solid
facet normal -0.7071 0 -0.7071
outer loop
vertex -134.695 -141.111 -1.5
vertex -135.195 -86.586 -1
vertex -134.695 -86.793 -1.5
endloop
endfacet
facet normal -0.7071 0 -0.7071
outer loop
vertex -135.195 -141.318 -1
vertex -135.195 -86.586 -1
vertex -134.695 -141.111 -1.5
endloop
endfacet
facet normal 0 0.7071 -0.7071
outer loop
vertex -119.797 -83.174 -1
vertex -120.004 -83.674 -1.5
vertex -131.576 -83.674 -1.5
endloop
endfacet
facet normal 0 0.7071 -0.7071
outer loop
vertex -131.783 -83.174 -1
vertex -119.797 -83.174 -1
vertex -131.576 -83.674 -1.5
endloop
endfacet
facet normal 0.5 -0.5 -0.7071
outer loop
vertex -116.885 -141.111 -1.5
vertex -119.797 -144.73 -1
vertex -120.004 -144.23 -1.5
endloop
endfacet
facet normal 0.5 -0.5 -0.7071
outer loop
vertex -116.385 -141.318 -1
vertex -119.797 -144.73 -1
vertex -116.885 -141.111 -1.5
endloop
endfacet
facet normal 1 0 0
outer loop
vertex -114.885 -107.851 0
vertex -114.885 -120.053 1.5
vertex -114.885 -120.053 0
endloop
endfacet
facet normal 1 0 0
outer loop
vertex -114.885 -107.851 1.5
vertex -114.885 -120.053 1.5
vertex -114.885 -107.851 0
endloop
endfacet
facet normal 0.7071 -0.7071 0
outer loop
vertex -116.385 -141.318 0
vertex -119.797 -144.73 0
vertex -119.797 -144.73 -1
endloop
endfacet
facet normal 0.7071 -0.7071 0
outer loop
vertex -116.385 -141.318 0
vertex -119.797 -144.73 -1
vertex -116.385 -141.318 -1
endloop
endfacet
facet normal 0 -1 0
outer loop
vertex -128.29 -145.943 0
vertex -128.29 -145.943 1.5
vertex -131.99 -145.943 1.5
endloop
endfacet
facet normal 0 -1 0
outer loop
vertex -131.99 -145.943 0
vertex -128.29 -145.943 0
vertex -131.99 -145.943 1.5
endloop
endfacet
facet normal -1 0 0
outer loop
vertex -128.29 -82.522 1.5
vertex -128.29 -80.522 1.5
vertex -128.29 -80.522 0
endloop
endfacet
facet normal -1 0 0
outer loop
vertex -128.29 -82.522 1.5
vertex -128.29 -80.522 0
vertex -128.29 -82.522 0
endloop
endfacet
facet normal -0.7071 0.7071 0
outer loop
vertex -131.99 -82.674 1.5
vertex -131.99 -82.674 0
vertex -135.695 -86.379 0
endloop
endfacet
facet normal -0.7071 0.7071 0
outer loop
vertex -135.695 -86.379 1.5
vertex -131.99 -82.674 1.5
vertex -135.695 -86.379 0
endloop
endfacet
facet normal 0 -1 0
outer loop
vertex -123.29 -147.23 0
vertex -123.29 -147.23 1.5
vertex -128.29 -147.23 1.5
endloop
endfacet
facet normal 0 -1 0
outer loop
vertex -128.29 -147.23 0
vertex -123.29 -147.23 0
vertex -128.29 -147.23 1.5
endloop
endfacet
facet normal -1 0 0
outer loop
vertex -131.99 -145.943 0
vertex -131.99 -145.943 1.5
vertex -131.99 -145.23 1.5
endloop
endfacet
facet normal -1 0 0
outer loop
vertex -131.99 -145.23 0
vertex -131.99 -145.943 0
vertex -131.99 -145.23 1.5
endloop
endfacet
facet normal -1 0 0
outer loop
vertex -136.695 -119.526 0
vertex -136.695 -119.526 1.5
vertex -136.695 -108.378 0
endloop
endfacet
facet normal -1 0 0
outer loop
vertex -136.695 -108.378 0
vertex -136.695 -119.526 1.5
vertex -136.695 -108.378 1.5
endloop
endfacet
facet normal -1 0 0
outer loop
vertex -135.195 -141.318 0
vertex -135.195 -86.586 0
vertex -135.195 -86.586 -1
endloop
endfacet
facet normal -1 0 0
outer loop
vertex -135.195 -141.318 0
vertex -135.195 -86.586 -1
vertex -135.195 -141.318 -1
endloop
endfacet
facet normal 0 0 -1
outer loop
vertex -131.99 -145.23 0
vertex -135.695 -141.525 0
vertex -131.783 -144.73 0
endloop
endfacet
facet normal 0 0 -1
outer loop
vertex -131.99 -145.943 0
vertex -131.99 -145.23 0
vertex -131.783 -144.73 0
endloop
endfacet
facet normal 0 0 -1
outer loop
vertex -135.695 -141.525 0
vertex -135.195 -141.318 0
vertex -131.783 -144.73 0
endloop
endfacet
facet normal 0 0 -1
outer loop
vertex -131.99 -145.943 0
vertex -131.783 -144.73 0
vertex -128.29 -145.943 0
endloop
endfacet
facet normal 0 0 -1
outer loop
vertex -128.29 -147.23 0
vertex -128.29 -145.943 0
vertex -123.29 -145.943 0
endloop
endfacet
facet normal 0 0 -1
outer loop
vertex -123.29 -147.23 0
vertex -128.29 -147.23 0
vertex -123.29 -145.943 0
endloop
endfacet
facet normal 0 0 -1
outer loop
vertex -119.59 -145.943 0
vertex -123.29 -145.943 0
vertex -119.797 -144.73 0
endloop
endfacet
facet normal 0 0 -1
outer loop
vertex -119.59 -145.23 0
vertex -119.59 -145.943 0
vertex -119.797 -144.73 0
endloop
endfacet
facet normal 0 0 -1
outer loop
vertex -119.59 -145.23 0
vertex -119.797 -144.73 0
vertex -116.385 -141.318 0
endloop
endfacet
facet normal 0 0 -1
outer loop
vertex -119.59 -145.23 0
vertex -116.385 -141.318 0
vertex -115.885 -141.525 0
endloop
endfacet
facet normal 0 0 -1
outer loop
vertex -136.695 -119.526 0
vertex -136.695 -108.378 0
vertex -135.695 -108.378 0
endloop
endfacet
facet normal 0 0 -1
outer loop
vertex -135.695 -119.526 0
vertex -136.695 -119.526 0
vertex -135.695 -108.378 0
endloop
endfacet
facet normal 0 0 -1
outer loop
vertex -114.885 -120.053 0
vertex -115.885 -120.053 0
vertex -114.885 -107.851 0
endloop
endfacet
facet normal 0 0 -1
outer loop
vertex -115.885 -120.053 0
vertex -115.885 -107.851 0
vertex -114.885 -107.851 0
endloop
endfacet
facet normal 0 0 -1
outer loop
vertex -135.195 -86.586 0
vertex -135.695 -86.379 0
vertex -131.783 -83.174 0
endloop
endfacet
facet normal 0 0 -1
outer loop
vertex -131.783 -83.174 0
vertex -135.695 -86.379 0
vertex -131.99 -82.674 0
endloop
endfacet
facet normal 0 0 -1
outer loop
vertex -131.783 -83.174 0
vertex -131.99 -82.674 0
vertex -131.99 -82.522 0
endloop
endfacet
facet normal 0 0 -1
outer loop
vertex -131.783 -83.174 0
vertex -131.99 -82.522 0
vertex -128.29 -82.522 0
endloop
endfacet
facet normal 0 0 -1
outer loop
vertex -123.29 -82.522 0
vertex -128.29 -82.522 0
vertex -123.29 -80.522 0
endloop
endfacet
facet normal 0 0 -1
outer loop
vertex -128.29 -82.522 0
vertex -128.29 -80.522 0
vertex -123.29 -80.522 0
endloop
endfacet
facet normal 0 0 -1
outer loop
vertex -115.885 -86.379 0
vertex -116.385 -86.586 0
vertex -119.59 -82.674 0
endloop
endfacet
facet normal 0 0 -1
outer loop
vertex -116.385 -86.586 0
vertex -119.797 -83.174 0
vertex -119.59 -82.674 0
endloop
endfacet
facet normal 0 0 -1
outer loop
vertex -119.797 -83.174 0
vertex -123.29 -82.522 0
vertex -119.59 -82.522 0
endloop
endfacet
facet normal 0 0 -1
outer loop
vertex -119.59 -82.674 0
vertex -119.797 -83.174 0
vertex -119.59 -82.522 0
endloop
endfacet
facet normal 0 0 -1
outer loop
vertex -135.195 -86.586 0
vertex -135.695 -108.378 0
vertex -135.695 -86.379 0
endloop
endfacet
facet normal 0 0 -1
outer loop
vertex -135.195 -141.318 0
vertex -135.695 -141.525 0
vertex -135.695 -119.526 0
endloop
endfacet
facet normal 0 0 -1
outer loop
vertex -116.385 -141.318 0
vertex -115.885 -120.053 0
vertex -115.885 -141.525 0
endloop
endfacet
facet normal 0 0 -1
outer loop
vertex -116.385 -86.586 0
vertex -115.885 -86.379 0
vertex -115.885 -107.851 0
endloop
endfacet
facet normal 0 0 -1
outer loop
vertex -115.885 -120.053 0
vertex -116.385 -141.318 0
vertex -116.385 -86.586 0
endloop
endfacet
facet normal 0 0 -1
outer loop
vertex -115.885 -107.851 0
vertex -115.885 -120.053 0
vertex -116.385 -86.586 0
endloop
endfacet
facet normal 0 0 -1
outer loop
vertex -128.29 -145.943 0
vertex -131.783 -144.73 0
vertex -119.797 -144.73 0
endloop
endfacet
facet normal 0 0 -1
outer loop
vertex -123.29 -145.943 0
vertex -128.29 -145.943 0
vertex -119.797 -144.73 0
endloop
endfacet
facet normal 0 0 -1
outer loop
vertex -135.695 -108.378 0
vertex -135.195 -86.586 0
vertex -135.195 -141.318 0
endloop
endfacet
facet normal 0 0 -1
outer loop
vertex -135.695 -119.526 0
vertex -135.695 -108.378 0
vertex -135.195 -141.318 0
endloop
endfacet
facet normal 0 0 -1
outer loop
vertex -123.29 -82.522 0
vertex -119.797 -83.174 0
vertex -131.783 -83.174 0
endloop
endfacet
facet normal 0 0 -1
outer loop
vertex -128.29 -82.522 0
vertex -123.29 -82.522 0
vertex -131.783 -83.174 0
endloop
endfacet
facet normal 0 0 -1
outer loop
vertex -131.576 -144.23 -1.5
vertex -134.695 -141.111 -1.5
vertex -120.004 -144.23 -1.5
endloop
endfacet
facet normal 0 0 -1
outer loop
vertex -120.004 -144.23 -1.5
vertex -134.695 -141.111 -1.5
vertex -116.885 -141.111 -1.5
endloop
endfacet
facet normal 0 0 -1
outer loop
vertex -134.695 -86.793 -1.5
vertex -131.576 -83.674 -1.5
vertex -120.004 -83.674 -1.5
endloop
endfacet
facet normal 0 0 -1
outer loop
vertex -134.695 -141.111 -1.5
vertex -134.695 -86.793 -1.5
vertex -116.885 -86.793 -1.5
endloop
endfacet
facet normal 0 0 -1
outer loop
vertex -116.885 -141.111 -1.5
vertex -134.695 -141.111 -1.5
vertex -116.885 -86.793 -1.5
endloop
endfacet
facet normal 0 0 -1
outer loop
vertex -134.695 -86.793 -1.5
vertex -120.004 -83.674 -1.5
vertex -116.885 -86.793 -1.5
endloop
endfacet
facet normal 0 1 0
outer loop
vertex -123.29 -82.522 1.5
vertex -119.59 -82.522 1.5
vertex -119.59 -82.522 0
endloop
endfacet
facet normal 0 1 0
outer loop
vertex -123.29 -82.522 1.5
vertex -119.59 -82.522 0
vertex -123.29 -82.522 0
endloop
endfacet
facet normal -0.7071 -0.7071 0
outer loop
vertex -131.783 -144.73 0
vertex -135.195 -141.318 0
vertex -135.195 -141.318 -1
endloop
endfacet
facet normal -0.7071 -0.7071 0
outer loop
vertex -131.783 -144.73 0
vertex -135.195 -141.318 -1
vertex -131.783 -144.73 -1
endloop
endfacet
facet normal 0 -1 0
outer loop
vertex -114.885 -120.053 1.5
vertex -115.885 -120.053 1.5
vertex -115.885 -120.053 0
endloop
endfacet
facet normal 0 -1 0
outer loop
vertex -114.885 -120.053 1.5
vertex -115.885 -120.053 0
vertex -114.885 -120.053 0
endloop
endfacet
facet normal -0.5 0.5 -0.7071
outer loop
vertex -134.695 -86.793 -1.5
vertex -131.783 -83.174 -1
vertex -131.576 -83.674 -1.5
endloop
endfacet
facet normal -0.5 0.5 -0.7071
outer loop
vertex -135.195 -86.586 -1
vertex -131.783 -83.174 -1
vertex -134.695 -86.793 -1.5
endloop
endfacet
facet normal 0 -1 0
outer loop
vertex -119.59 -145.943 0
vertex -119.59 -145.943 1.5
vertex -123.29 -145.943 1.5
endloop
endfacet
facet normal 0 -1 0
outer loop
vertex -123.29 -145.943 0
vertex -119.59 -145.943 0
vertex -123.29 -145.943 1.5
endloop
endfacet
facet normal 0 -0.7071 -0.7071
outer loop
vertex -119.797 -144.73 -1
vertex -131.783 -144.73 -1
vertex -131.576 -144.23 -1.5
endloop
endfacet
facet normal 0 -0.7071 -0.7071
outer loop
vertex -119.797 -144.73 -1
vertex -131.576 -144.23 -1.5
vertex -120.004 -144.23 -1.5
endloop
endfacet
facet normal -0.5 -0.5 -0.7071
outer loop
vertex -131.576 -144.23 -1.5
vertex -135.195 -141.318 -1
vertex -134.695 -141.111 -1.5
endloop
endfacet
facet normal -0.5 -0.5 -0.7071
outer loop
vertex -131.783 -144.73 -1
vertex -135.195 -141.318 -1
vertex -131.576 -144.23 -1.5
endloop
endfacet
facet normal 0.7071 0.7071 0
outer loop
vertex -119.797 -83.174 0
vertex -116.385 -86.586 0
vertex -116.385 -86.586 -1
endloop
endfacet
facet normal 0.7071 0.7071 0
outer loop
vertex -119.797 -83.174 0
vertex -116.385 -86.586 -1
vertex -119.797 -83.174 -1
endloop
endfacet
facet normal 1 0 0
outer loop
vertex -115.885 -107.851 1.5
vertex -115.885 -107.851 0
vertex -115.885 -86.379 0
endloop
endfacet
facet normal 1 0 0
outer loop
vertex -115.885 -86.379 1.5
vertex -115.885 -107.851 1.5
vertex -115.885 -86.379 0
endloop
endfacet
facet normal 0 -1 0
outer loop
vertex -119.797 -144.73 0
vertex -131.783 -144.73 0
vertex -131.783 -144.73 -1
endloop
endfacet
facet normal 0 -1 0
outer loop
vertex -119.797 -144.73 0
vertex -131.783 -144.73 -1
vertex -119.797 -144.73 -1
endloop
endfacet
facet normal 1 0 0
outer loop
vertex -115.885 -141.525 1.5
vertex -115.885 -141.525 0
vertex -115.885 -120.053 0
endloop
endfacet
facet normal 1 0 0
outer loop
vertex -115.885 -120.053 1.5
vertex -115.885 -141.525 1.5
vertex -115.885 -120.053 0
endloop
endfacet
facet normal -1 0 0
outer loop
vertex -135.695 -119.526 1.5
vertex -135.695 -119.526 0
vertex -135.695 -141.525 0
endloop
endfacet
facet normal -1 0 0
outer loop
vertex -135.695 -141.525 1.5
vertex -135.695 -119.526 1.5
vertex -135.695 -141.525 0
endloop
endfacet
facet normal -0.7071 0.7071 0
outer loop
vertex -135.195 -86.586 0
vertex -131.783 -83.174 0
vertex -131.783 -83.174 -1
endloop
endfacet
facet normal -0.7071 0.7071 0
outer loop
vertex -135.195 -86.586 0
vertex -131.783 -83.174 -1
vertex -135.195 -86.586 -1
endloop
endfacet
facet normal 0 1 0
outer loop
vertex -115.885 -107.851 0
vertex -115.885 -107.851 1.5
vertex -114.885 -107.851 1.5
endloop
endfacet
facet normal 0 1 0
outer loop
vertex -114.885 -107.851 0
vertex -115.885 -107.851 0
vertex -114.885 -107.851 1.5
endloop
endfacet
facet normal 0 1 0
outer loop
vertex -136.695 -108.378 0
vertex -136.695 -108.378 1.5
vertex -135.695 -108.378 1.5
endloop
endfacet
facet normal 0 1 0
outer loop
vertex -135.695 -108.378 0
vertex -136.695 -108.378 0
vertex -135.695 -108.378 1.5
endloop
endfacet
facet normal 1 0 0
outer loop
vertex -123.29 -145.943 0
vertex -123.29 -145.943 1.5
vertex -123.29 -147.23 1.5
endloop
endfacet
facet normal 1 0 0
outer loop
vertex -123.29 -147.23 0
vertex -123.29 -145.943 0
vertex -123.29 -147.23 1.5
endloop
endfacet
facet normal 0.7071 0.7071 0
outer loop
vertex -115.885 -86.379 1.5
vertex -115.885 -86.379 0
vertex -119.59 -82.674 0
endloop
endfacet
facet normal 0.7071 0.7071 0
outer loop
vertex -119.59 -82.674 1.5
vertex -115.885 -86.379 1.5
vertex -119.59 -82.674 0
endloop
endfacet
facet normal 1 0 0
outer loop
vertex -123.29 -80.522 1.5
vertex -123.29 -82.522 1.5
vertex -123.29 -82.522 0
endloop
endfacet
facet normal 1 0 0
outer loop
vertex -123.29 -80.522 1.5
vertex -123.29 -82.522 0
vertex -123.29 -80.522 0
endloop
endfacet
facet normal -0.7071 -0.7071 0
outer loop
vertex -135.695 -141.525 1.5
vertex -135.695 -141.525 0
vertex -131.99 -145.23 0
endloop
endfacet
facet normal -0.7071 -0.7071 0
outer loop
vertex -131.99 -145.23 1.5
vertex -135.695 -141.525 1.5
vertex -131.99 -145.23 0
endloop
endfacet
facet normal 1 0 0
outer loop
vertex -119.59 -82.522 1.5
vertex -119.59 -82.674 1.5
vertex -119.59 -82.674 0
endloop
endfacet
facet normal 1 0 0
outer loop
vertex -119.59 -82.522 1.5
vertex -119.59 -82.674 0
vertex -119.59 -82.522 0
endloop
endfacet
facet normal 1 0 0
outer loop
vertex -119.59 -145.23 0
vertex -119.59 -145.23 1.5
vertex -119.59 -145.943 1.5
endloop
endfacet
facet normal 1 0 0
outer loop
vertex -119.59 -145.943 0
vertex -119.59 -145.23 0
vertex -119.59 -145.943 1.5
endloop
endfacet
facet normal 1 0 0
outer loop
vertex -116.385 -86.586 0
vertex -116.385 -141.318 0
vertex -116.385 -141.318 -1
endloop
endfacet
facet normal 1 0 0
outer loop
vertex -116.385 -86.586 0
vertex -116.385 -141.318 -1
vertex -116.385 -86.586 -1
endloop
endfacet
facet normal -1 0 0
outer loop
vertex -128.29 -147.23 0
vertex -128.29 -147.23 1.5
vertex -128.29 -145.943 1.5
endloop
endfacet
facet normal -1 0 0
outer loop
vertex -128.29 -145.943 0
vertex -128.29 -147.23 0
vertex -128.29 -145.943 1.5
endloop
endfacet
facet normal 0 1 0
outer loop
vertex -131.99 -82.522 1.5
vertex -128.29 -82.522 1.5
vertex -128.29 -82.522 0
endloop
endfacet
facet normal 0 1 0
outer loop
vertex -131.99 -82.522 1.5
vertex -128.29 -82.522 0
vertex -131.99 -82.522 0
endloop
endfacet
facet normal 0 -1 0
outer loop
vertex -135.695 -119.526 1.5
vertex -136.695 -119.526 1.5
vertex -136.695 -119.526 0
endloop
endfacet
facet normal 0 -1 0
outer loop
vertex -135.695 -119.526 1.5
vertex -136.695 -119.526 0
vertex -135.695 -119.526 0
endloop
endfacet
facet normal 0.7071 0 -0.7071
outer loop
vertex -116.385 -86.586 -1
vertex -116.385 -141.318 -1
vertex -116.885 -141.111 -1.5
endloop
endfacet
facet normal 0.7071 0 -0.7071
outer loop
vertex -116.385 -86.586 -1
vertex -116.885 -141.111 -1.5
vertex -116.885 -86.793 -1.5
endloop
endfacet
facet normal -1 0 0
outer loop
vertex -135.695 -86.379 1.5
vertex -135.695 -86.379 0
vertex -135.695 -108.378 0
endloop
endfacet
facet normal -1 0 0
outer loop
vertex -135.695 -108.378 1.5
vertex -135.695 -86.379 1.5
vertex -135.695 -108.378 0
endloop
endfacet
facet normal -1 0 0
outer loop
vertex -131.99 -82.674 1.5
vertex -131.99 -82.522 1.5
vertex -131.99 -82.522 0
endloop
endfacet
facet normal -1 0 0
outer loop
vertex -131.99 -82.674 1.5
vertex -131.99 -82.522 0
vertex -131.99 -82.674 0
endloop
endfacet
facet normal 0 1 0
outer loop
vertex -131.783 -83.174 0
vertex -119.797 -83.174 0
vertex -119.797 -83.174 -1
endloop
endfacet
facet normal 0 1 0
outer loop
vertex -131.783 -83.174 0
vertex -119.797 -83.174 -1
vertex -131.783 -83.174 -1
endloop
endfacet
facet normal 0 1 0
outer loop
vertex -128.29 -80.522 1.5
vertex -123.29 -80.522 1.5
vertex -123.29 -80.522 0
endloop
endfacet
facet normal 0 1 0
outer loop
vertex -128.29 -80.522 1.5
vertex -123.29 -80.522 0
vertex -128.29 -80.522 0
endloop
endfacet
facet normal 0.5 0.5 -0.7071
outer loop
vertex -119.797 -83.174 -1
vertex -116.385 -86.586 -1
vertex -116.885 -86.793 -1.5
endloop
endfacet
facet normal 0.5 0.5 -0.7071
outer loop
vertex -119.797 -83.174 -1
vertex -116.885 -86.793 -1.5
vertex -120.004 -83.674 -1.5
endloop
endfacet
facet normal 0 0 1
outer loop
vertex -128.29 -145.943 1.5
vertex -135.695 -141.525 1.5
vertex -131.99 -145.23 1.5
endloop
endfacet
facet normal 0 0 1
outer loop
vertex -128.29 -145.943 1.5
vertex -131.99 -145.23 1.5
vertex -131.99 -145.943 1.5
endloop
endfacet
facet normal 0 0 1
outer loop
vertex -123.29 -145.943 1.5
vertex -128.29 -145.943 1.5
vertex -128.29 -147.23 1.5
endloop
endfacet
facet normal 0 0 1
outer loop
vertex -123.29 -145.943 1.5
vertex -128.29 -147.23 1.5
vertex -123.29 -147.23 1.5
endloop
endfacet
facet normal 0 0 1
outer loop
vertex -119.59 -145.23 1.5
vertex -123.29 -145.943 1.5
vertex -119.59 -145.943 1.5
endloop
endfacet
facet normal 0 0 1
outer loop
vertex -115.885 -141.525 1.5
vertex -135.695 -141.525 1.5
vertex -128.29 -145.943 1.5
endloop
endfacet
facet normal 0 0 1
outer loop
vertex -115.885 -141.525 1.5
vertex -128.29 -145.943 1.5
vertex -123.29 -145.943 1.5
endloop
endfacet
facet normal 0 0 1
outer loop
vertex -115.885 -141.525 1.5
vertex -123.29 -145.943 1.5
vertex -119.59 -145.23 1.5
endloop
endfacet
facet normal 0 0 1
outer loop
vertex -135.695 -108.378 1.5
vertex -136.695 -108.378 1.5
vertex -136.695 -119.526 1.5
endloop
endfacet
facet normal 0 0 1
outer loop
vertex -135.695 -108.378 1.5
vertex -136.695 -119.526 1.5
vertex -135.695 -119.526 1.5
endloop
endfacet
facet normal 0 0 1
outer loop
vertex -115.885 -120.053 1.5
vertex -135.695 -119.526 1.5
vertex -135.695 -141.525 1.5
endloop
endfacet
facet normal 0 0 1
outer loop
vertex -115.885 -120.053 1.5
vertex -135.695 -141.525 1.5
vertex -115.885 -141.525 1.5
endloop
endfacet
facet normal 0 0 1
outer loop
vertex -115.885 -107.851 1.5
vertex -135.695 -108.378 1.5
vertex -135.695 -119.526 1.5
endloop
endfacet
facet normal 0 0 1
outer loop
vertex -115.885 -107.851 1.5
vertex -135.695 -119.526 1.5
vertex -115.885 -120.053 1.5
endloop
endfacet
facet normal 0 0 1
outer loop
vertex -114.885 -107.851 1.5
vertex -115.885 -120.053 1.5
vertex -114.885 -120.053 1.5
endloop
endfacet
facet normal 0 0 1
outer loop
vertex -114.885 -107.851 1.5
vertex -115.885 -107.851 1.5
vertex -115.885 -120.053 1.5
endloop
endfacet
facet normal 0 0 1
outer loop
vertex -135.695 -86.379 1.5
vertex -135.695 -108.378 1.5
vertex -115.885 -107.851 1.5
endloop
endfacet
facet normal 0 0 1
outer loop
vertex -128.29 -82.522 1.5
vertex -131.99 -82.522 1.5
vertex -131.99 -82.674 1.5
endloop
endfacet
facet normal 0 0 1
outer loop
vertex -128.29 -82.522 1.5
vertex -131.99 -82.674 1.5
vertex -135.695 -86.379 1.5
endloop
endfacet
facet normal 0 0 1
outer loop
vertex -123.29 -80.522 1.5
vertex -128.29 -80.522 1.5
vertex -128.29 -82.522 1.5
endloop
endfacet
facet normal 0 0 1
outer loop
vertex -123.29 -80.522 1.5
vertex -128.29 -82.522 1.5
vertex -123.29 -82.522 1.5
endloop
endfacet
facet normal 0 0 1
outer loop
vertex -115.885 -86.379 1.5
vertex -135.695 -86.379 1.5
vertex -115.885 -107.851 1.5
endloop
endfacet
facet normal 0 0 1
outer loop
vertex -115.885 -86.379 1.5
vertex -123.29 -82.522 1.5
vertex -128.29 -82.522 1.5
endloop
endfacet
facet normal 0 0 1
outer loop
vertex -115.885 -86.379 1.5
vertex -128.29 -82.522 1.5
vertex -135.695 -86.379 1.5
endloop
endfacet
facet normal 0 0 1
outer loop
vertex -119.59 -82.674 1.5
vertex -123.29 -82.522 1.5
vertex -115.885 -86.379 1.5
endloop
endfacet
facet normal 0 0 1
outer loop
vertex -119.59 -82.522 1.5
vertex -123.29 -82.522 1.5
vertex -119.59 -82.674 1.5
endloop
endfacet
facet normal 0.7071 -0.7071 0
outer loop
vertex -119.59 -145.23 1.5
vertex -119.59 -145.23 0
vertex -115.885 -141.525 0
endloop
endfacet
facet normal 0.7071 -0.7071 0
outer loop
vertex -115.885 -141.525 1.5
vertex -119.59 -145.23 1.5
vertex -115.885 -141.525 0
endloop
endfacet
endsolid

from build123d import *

# Parameters (mm, degrees)
BOSS_EXTRUDE1_DEPTH = 1.5
BOSS_EXTRUDE2_DEPTH = 1.5
SKETCH3_W           = 2
SKETCH3_H           = 12.202692118
SKETCH3_H_2         = 11.147562167
BOSS_EXTRUDE3_DEPTH = 1.5
CHAMFER2_SIZE       = 0.5


with BuildPart() as part:
    # Sketch1 → Boss-Extrude1 (new body)
    with BuildSketch(Plane.XY):
        Polygon((-135.194999999, -141.317867967), (-131.782867965, -144.730000001), (-119.797132034, -144.730000001), (-116.384999999, -141.317867967), (-116.384999999, -86.586255973), (-119.797132034, -83.174123939), (-131.782867965, -83.174123939), (-135.194999999, -86.586255973), align=None)
    extrude(amount=-BOSS_EXTRUDE1_DEPTH)

    # Sketch2 → Boss-Extrude2 (add)
    with BuildSketch(Plane.XY):
        Polygon((-135.694999999, -86.379149192), (-135.694999999, -141.524974748), (-131.989974746, -145.230000001), (-119.590025252, -145.230000001), (-115.884999999, -141.524974748), (-115.884999999, -86.379149192), (-119.590025252, -82.674123939), (-131.989974746, -82.674123939), align=None)
    extrude(amount=BOSS_EXTRUDE2_DEPTH)

    # Sketch3 → Boss-Extrude3 (add)
    with BuildSketch(Plane.XY.offset(1.5)):
        Polygon((-131.989974746, -83.526014077), (-128.289999999, -83.526014077), (-128.289999999, -84.5222338), (-123.289999999, -84.5222338), (-123.289999999, -83.526014077), (-119.590025252, -83.526014077), (-119.590025252, -82.5222338), (-123.289999999, -82.5222338), (-123.289999999, -80.5222338), (-128.289999999, -80.5222338), (-128.289999999, -82.5222338), (-131.989974746, -82.5222338), align=None)
        Polygon((-131.989974746, -143.816923353), (-128.289999999, -143.816923353), (-128.289999999, -143.230000001), (-123.289999999, -143.230000001), (-123.289999999, -143.816923353), (-119.590025252, -143.816923353), (-119.590025252, -145.943076649), (-123.289999999, -145.943076649), (-123.289999999, -147.230000001), (-128.289999999, -147.230000001), (-128.289999999, -145.943076649), (-131.989974746, -145.943076649), align=None)
        with Locations((-115.884999999, -113.95206197)):
            Rectangle(SKETCH3_W, SKETCH3_H)
        with Locations((-135.694999999, -113.95206197)):
            Rectangle(SKETCH3_W, SKETCH3_H_2)
    extrude(amount=-BOSS_EXTRUDE3_DEPTH)

    # Chamfer2
    chamfer2_edges = [part.edges().sort_by_distance(p)[0] for p in [
        (-125.789999999, -144.730000001, -1.5),
        (-118.091066016, -143.023933984, -1.5),
        (-116.384999999, -113.95206197, -1.5),
        (-118.091066016, -84.880189956, -1.5),
        (-125.789999999, -83.174123939, -1.5),
        (-133.488933982, -84.880189956, -1.5),
        (-135.194999999, -113.95206197, -1.5),
        (-133.488933982, -143.023933984, -1.5),
    ]]
    chamfer(chamfer2_edges, length=CHAMFER2_SIZE)


solid = part.part
